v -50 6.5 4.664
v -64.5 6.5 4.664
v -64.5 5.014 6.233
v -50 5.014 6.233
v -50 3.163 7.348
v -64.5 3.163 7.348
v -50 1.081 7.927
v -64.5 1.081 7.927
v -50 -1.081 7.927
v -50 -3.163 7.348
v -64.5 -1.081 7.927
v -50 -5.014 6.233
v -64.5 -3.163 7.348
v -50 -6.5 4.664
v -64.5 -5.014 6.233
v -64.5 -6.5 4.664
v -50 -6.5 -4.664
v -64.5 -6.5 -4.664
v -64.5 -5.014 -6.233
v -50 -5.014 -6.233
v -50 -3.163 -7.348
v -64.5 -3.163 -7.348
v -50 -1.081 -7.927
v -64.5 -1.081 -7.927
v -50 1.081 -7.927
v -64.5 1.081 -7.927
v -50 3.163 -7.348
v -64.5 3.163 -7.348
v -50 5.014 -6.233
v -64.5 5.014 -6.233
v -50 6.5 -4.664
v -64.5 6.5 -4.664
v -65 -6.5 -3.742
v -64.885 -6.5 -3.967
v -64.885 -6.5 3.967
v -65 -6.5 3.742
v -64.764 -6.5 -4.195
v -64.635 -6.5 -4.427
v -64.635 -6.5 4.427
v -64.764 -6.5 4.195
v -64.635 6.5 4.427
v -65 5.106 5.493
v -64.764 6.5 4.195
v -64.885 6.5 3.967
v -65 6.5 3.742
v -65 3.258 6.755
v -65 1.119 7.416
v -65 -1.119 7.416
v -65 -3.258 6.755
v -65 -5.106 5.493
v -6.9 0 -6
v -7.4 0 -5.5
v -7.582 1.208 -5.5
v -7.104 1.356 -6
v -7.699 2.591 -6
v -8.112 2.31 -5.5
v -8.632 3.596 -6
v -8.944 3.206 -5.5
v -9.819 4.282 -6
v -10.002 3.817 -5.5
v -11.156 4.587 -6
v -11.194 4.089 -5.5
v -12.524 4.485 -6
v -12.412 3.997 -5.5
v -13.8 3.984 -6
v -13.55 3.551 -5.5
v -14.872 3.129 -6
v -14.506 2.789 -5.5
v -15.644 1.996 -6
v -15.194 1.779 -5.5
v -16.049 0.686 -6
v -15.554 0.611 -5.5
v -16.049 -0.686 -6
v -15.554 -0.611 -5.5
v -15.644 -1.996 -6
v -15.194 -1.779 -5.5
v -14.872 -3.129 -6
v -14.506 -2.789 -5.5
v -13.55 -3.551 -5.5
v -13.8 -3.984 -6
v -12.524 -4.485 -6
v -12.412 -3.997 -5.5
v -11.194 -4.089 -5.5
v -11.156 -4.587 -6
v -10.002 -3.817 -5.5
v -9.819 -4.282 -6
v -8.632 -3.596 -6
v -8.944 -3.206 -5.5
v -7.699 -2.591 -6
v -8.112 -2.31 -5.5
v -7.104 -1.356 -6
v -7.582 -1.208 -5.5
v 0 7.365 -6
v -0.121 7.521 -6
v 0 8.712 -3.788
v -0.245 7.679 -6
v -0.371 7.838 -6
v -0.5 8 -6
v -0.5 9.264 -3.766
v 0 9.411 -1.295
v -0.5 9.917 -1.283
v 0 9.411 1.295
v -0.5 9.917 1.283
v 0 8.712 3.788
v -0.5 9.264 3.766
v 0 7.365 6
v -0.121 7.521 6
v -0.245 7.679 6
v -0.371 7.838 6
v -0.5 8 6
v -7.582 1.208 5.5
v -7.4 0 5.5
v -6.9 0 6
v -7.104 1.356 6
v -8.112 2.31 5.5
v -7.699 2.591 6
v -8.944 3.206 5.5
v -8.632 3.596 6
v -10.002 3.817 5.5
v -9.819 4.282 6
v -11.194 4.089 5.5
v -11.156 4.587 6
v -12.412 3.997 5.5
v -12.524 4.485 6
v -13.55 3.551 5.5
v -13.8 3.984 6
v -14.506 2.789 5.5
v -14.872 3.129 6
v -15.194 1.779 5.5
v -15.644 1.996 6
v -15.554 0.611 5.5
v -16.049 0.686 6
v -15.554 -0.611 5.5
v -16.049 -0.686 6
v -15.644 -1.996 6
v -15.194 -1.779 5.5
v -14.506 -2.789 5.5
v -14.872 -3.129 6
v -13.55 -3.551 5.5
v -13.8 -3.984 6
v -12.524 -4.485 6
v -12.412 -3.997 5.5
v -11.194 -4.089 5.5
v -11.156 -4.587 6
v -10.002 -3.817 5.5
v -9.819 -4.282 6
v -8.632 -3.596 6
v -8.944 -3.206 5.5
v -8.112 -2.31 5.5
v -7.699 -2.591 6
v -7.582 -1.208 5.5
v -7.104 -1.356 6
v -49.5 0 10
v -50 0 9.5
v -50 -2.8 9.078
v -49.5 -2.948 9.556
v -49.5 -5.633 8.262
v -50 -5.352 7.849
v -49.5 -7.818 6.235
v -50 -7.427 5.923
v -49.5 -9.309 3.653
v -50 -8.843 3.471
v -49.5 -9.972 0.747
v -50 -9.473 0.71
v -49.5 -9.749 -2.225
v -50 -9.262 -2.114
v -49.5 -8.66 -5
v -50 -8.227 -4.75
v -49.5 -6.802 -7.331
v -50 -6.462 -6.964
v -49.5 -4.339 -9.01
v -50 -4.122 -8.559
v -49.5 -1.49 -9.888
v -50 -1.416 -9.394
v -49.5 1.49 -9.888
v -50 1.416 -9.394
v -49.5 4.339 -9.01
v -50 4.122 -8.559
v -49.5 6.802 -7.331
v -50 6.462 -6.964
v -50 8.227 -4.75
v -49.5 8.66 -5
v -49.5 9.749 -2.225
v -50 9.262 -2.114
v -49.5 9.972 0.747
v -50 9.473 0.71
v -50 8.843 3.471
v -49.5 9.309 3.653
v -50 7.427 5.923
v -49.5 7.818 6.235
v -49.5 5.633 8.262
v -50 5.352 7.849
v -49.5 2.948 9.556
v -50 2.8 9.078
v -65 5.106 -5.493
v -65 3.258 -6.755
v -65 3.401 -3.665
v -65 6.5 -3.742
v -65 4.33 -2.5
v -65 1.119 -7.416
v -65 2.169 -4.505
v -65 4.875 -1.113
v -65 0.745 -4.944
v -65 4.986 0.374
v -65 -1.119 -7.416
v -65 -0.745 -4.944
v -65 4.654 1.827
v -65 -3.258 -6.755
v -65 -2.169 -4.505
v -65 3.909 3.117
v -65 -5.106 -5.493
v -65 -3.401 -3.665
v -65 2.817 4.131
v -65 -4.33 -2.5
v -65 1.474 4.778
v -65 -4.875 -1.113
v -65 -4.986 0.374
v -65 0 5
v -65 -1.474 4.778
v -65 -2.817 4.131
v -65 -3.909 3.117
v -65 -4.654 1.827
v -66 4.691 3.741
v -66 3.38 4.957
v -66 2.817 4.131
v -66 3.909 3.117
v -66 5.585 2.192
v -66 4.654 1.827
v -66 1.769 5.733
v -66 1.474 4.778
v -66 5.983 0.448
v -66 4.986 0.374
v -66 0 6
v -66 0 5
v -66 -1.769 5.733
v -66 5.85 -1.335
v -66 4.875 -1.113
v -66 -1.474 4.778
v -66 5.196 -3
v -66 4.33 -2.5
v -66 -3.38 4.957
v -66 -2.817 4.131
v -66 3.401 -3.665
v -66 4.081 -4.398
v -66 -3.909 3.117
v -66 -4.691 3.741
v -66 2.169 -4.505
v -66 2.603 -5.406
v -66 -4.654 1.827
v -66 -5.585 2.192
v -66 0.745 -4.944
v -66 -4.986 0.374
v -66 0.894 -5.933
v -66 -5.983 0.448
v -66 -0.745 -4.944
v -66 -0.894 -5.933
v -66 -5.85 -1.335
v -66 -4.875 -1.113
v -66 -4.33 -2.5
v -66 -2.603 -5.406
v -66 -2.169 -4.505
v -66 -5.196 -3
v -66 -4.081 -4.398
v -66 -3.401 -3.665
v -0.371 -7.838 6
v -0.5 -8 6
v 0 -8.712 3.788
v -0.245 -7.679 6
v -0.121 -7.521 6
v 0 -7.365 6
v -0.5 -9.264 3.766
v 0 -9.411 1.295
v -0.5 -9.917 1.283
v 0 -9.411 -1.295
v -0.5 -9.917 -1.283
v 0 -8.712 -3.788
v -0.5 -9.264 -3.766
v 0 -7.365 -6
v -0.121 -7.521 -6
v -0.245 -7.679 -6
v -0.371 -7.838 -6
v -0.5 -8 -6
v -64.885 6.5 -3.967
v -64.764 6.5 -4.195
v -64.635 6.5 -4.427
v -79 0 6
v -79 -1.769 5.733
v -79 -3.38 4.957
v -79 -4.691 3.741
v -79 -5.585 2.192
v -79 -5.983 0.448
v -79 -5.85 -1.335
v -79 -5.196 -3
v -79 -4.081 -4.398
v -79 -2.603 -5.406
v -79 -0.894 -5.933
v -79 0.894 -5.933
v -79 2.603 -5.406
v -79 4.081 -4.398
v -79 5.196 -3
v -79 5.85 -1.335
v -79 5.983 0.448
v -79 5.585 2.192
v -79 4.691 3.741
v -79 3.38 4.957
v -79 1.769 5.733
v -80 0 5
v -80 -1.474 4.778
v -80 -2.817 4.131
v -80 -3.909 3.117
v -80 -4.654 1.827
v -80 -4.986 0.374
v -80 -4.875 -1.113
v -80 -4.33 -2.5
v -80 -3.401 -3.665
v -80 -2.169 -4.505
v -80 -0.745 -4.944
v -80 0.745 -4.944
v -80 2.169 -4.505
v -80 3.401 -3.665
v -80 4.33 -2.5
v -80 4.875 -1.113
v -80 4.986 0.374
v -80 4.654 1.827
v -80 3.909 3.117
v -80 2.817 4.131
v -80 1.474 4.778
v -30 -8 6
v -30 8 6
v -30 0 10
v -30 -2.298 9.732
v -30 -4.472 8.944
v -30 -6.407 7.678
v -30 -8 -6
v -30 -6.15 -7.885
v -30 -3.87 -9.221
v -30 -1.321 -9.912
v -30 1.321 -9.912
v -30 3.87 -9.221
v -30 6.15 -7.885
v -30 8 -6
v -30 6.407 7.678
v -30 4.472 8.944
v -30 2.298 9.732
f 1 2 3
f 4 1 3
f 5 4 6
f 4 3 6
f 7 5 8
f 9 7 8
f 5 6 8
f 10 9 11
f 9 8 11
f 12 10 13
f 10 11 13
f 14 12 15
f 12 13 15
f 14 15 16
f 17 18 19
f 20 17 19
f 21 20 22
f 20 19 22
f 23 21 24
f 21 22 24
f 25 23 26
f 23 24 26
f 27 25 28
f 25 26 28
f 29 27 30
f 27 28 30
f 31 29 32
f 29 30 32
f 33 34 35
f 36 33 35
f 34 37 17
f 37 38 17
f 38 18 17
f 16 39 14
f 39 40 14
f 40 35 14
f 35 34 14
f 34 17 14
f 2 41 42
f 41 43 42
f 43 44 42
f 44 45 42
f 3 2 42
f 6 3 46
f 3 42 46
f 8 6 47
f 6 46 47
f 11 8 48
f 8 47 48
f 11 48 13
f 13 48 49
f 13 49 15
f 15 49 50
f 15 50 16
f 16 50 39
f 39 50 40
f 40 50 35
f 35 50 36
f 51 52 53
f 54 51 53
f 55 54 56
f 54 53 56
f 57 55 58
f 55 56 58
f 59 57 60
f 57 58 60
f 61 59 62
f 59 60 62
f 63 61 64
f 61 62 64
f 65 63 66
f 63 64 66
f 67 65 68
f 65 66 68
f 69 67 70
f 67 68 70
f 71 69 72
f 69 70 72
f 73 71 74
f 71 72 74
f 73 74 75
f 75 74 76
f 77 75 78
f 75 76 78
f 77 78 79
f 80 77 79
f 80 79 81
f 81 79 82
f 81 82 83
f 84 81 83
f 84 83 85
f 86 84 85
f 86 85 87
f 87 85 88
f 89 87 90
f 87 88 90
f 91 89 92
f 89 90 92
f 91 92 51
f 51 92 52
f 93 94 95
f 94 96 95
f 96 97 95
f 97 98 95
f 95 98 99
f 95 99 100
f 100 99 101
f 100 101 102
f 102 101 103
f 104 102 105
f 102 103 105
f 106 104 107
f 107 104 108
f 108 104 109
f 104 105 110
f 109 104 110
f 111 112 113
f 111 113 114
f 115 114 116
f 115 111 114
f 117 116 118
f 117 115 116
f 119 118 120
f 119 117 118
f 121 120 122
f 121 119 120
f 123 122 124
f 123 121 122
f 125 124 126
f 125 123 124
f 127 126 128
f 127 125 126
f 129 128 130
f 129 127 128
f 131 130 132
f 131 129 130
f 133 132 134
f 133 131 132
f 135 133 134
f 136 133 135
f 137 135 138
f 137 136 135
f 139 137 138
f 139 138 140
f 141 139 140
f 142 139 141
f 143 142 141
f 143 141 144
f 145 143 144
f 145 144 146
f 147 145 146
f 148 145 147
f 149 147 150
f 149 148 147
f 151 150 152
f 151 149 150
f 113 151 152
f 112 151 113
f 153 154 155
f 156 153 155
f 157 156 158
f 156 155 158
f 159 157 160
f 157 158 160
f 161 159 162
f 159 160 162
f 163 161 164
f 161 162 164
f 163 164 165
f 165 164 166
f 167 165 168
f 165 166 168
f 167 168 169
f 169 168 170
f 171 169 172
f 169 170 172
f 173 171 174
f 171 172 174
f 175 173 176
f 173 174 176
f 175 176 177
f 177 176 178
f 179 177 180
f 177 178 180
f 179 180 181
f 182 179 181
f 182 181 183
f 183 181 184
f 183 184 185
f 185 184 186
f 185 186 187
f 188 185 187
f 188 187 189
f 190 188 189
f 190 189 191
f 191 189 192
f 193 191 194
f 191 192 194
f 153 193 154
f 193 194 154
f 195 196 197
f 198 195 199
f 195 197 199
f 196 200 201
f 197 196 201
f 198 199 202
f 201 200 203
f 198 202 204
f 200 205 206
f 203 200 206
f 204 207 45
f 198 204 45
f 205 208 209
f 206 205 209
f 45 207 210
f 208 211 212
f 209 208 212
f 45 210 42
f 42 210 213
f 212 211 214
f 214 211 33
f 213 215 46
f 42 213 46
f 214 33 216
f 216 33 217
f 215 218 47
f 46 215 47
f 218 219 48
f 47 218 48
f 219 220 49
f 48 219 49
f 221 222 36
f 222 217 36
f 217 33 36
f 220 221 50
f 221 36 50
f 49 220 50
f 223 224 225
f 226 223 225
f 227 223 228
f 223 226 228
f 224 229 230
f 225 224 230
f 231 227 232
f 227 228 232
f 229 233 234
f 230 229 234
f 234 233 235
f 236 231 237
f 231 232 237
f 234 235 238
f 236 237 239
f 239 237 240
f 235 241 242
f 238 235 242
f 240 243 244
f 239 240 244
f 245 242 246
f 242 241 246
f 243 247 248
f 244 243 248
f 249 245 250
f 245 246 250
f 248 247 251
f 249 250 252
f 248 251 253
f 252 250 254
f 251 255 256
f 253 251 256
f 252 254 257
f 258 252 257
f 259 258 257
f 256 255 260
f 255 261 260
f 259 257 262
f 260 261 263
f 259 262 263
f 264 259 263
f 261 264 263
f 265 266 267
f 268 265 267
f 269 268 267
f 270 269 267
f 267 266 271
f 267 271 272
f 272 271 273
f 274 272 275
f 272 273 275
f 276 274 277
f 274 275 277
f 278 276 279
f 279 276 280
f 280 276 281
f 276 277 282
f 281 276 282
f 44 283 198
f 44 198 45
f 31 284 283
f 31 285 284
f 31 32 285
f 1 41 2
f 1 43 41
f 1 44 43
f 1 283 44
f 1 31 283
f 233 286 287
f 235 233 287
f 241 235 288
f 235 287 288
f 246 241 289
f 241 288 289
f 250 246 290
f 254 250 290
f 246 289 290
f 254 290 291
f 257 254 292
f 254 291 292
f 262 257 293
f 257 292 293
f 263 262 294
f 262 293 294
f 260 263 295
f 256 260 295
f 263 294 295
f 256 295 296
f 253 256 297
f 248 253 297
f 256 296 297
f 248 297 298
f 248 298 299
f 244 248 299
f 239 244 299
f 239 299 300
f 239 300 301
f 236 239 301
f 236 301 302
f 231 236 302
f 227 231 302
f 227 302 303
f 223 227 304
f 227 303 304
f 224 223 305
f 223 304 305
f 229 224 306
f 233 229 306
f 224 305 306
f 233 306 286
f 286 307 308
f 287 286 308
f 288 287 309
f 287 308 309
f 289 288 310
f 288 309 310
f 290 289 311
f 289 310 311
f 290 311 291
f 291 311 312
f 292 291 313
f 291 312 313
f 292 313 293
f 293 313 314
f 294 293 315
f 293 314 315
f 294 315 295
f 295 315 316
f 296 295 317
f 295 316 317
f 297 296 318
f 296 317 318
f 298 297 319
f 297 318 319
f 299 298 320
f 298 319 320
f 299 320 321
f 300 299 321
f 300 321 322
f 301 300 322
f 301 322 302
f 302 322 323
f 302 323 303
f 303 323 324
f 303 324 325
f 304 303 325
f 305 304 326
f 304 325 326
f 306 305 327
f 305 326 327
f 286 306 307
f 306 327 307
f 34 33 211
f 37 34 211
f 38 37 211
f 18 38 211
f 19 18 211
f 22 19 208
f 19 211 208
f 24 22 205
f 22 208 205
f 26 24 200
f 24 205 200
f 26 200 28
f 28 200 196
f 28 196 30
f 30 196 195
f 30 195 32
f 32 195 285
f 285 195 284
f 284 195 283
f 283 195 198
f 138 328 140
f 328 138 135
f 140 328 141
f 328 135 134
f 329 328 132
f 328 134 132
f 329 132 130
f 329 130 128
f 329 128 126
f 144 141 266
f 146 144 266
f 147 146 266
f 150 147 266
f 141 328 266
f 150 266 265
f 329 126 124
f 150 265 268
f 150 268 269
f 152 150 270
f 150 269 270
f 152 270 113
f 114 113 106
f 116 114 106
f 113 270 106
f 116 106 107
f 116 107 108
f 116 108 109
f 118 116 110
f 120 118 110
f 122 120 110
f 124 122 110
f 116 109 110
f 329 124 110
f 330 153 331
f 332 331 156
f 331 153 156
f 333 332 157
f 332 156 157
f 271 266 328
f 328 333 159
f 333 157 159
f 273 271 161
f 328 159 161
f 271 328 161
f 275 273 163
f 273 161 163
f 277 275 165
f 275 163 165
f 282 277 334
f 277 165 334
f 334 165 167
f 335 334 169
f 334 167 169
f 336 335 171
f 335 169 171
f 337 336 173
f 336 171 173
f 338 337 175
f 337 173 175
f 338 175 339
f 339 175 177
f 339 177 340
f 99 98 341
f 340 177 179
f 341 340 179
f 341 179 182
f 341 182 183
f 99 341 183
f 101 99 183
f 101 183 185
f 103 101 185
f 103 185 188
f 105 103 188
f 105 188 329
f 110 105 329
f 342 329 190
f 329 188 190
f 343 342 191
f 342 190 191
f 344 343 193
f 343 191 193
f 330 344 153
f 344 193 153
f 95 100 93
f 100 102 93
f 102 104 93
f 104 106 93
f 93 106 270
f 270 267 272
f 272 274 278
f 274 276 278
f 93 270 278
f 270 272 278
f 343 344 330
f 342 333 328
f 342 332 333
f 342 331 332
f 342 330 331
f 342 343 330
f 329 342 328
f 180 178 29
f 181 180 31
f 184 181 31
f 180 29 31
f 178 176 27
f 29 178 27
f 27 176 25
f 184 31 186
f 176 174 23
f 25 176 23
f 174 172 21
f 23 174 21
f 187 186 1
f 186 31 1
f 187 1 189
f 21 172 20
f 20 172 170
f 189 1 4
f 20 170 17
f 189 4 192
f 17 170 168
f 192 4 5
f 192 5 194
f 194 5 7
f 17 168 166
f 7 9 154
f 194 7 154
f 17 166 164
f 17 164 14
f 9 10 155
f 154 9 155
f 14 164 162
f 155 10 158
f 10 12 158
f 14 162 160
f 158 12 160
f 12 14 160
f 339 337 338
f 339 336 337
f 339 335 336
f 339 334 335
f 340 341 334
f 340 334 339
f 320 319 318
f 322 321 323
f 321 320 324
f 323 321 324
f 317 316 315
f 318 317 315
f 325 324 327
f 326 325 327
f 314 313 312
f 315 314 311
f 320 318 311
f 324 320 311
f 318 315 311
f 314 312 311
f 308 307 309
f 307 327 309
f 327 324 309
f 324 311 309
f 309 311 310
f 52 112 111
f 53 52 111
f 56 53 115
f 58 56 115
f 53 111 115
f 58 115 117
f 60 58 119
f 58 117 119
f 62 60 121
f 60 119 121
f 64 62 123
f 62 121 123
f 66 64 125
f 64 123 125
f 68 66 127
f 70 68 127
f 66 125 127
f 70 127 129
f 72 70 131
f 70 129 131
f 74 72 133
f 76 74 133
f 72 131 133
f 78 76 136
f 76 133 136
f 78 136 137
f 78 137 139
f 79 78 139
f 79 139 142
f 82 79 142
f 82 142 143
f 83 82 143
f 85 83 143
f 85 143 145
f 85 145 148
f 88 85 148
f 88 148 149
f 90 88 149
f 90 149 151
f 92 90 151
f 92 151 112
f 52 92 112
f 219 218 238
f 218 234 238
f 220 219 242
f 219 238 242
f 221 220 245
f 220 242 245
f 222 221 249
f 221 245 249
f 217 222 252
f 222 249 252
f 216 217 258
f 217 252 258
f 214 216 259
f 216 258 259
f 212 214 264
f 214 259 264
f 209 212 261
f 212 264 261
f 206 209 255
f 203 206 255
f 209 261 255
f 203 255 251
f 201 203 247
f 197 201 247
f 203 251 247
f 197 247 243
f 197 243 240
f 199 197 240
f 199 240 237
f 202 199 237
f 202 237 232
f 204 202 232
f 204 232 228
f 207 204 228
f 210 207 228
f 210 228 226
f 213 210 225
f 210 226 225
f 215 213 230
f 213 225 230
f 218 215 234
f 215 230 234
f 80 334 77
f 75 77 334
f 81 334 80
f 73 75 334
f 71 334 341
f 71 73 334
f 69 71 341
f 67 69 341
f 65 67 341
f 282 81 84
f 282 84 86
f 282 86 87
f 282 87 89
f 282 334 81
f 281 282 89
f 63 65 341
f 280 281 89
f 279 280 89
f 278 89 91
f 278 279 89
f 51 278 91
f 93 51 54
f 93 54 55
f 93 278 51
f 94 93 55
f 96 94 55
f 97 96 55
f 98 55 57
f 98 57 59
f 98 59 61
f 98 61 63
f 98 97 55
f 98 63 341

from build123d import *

# Parameters (mm, degrees)
CHANFREIN1_SIZE         = 0.5
CHANFREIN2_SIZE         = 1
ESQUISSE2_W             = 9
ESQUISSE2_H             = 30
ENL_V_MAT_EXTRU_1_DEPTH = 30
ENL_V_MAT_EXTRU_2_REACH = 84.195
ESQUISSE3_R             = 4.1
CHANFREIN3_SIZE         = 0.5
ENL_V_MAT_EXTRU_3_REACH = 53.962
ESQUISSE5_W             = 20
ESQUISSE5_H             = 3.5


with BuildPart() as part:
    # Esquisse1 → Révolution1 (revolve)
    with BuildSketch(Plane.XY, mode=Mode.PRIVATE) as r_volution1_sk:
        Polygon((-50, 8), (-65, 8), (-65, 5), (-66, 5), (-66, 6), (-80, 6), (-80, 0), (0, 0), (0, 10), (-50, 10), align=None)
    revolve(r_volution1_sk.sketch.rotate(Axis((0, 0, 0), (1, 0, 0)), 90), axis=Axis((0, 0, 0), (1, 0, 0)))

    # Chanfrein1
    chanfrein1_edges = [part.edges().sort_by_distance(p)[0] for p in [
        (-50, 0, -10),
        (0, 0, -10),
        (-65, 0, -8),
    ]]
    chamfer(chanfrein1_edges, length=CHANFREIN1_SIZE)

    # Chanfrein2
    chanfrein2_edges = [part.edges().sort_by_distance(p)[0] for p in [
        (-80, 0, -6),
    ]]
    chamfer(chanfrein2_edges, length=CHANFREIN2_SIZE)

    # Esquisse2 → Enlèv. mat.-Extru.1 (cut)
    with BuildSketch(Plane(origin=(0, 0, 0), x_dir=(0, 0, -1), z_dir=(1, 0, 0))):
        with Locations((-10.5, 0)):
            Rectangle(ESQUISSE2_W, ESQUISSE2_H)
        with Locations((10.5, 0)):
            Rectangle(ESQUISSE2_W, ESQUISSE2_H)
    extrude(amount=-ENL_V_MAT_EXTRU_1_DEPTH, mode=Mode.SUBTRACT)

    # Esquisse3 → Enlèv. mat.-Extru.2 (cut, up to next)
    with BuildSketch(Plane.XY.offset(6), mode=Mode.PRIVATE) as enl_v_mat_extru_2_sk1:
        with Locations((-11.5, 0)):
            Circle(ESQUISSE3_R)
    enl_v_mat_extru_2_tool1 = extrude(enl_v_mat_extru_2_sk1.sketch, amount=-ENL_V_MAT_EXTRU_2_REACH, mode=Mode.PRIVATE) & part.part
    add(enl_v_mat_extru_2_tool1.solids().sort_by_distance((-11.5, 0, 6))[0], mode=Mode.SUBTRACT)

    # Chanfrein3
    chanfrein3_edges = [part.edges().sort_by_distance(p)[0] for p in [
        (-15.6, 0, 6),
        (-15.6, 0, -6),
    ]]
    chamfer(chanfrein3_edges, length=CHANFREIN3_SIZE)

    # Esquisse5 → Enlèv. mat.-Extru.3 (cut, up to next)
    with BuildSketch(Plane.ZY.offset(50), mode=Mode.PRIVATE) as enl_v_mat_extru_3_sk1:
        with Locations((0, 8.25)):
            Rectangle(ESQUISSE5_W, ESQUISSE5_H)
    enl_v_mat_extru_3_tool1 = extrude(enl_v_mat_extru_3_sk1.sketch, amount=ENL_V_MAT_EXTRU_3_REACH, mode=Mode.PRIVATE) & part.part
    # Esquisse5 → Enlèv. mat.-Extru.3 (cut, up to next)
    with BuildSketch(Plane.ZY.offset(50), mode=Mode.PRIVATE) as enl_v_mat_extru_3_sk2:
        with Locations((0, -8.25)):
            Rectangle(ESQUISSE5_W, ESQUISSE5_H)
    enl_v_mat_extru_3_tool2 = extrude(enl_v_mat_extru_3_sk2.sketch, amount=ENL_V_MAT_EXTRU_3_REACH, mode=Mode.PRIVATE) & part.part
    add(enl_v_mat_extru_3_tool1.solids().sort_by_distance((-50, 8.25, 0))[0], mode=Mode.SUBTRACT)
    add(enl_v_mat_extru_3_tool2.solids().sort_by_distance((-50, -8.25, 0))[0], mode=Mode.SUBTRACT)


solid = part.part
